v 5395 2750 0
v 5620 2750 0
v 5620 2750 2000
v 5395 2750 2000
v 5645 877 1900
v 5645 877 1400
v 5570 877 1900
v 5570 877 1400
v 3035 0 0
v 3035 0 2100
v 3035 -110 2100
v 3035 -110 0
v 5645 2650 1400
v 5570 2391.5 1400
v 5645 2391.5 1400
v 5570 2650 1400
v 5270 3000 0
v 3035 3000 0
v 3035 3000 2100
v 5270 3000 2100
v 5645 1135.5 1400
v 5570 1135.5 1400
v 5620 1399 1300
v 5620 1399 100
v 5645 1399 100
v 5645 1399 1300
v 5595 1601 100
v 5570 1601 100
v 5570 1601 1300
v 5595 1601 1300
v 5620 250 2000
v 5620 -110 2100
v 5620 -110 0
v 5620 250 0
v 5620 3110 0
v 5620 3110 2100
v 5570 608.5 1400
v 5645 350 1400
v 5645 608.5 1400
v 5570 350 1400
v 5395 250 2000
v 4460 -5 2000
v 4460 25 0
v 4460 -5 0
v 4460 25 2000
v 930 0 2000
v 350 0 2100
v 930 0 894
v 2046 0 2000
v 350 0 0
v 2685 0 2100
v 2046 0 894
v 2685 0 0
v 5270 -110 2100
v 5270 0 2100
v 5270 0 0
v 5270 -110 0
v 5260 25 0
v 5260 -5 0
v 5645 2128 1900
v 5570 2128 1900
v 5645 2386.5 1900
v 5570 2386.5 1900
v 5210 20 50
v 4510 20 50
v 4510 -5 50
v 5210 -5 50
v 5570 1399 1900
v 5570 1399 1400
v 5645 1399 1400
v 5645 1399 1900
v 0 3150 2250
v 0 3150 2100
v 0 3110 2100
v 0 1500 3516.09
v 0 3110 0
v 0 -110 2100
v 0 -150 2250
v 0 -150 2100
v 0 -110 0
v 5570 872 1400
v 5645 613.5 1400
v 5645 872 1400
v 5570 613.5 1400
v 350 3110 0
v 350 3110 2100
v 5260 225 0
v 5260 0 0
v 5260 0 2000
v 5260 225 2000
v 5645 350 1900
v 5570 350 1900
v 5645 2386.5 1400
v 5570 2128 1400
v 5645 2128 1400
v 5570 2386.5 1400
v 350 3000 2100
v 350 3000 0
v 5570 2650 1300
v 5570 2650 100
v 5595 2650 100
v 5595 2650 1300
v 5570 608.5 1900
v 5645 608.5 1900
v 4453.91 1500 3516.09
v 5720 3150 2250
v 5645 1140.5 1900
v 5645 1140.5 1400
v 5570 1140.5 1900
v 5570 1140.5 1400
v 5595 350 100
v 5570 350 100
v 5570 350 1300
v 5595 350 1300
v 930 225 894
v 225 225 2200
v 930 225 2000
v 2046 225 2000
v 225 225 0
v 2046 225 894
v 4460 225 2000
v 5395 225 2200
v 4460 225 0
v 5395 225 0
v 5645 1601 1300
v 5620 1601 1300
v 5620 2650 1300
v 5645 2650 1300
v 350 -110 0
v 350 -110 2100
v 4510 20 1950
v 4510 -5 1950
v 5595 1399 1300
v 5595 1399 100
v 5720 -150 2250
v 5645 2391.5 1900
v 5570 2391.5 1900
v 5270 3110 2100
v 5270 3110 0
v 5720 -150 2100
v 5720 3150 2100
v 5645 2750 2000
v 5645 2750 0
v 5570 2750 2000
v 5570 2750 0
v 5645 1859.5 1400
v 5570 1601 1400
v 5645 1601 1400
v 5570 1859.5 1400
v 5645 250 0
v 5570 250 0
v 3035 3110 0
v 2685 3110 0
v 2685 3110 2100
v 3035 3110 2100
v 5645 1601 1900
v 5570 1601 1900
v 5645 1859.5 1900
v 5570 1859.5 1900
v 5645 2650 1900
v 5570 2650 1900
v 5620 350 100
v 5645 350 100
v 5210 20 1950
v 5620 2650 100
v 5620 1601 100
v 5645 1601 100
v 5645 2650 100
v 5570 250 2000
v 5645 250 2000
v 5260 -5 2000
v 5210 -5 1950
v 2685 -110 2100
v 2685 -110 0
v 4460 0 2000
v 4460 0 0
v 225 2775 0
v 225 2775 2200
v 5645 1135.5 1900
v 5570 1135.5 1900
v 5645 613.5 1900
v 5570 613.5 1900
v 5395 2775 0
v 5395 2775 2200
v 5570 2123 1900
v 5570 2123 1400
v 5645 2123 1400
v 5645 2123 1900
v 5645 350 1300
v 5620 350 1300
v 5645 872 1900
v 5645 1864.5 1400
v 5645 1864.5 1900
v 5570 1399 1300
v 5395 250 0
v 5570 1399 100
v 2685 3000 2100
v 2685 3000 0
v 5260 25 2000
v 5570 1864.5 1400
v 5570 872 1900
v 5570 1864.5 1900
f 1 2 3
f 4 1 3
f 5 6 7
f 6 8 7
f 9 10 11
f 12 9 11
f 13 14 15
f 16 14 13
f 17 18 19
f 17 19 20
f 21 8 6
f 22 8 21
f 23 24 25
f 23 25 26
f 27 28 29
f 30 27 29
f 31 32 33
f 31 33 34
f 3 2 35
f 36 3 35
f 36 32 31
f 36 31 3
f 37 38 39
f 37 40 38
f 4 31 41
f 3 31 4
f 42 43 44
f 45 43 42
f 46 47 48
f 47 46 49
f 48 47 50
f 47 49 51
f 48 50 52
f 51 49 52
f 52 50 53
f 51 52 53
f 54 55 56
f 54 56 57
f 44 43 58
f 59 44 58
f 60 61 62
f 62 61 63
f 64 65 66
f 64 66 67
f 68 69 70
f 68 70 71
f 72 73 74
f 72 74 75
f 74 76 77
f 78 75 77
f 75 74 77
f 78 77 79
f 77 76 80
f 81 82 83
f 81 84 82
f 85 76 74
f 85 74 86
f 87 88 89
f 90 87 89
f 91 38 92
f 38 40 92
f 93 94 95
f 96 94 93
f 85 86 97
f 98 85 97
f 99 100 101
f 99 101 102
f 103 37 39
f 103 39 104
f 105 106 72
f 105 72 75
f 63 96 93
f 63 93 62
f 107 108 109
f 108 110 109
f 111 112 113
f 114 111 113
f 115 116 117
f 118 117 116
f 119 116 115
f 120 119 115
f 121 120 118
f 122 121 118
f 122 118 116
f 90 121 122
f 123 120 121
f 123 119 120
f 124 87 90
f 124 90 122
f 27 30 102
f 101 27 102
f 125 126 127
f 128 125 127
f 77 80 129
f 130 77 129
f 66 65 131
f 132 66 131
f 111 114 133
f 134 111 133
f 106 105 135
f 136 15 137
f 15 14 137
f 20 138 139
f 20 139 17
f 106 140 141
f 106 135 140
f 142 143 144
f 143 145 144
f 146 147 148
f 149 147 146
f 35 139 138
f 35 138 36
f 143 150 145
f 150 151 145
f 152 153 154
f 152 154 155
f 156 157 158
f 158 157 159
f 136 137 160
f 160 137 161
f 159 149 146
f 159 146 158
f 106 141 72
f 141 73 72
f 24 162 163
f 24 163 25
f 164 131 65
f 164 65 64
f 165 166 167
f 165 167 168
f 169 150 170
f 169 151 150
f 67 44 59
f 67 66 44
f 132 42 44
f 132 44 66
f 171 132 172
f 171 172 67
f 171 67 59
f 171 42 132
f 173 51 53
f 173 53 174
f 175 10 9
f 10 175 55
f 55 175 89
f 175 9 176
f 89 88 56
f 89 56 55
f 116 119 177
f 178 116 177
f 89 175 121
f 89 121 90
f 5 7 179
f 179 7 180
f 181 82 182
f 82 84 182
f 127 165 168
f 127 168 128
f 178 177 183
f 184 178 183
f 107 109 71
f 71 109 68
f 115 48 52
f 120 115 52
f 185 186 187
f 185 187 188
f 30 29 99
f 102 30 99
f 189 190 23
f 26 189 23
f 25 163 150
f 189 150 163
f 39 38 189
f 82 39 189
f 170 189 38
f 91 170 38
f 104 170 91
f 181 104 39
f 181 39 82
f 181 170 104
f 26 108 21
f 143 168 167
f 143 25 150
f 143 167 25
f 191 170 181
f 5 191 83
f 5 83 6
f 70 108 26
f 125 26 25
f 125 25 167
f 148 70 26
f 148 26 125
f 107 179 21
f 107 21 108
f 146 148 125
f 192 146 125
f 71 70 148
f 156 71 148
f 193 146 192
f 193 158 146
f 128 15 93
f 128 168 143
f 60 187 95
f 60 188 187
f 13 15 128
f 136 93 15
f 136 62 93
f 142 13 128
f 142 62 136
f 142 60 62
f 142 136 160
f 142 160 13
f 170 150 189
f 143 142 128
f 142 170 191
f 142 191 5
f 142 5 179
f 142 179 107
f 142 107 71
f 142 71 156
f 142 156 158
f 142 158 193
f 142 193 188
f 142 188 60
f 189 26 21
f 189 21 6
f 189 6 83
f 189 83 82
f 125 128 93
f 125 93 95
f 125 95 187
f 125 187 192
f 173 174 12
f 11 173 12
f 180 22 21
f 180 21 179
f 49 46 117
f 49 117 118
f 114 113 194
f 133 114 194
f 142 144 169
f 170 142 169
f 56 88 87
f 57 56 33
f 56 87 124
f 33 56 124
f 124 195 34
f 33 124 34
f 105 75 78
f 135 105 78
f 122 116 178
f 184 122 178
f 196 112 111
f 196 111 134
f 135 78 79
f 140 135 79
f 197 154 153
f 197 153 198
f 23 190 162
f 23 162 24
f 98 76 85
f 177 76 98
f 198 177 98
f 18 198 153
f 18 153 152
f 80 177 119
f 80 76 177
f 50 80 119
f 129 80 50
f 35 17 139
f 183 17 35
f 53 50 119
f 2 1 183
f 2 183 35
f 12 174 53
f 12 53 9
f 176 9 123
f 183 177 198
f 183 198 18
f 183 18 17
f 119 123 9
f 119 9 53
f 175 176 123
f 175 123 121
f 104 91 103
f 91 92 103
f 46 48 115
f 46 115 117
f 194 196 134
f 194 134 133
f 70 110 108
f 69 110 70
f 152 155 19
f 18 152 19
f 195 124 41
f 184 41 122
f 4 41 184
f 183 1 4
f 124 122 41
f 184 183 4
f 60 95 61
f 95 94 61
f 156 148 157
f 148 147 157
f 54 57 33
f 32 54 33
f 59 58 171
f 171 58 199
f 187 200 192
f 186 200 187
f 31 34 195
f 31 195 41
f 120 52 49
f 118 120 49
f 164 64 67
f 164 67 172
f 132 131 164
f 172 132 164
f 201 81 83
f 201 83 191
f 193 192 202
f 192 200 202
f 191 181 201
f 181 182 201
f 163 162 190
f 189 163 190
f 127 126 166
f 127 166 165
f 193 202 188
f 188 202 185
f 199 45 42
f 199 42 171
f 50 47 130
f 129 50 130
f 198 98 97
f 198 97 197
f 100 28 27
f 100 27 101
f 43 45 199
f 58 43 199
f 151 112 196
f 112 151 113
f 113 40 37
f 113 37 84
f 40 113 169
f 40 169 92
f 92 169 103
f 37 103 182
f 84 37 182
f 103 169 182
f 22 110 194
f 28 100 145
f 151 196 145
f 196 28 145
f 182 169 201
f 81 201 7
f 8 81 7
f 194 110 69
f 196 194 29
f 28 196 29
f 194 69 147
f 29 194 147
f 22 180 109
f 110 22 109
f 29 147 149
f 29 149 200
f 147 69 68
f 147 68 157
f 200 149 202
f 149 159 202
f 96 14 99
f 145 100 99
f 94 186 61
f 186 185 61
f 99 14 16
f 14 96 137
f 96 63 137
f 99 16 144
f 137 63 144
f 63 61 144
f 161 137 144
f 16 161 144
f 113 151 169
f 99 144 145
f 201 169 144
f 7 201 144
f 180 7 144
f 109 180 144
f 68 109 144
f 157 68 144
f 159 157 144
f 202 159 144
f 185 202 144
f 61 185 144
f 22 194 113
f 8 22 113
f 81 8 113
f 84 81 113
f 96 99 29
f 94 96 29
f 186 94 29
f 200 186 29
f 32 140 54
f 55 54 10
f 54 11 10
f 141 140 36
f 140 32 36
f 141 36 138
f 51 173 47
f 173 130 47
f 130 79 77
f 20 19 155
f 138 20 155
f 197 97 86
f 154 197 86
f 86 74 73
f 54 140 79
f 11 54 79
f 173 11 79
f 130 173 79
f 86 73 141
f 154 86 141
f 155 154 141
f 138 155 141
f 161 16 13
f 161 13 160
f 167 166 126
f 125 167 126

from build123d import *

# Parameters (mm, degrees)
F0_W           = 5620
F0_H           = 3000
F0_W_2         = 5170
F0_H_2         = 2550
F1_DEPTH       = 2200
F2_W           = 2500
F2_H           = 2000
F3_DEPTH       = 225
F4_W           = 1116
F4_H           = 1106
F4_W_2         = 800
F4_H_2         = 2000
F5_DEPTH       = 225
F7_W           = 800
F7_H           = 2000
F7_W_2         = 700
F7_H_2         = 1900
F8_DEPTH       = 30
F9_DEPTH       = 5
F11_DEPTH      = 5620
F11_DEPTH_BACK = 100
F12_DEPTH      = 100
F14_DEPTH      = 6760
F15_W          = 350
F15_H          = 110
F16_DEPTH      = 2100
F17_W          = 1249
F17_H          = 2000
F17_W_2        = 1049
F17_H_2        = 1200
F17_W_3        = 258.5
F17_H_3        = 500
F17_W_4        = 2
F18_DEPTH      = 50
F18_DEPTH_BACK = 25
F19_DEPTH      = 25


with BuildPart() as f1:
    # F0 (on Top) → F1 (new body)
    with BuildSketch(Plane.XY):
        with Locations((2810, 1500)):
            Rectangle(F0_W, F0_H)
        with Locations((2810, 1500)):
            Rectangle(F0_W_2, F0_H_2, mode=Mode.SUBTRACT)
    extrude(amount=F1_DEPTH)

    # F2 (on face) → F3 (cut, through all)
    with BuildSketch(Plane.YZ.offset(5620)):
        with Locations((1500, 1000)):
            Rectangle(F2_W, F2_H)
    extrude(amount=-F3_DEPTH, mode=Mode.SUBTRACT)

    # F4 (on face) → F5 (cut, through all)
    with BuildSketch(Plane.XZ):
        with Locations((1488, 1447)):
            Rectangle(F4_W, F4_H)
        with Locations((4860, 1000)):
            Rectangle(F4_W_2, F4_H_2)
    extrude(amount=-F5_DEPTH, mode=Mode.SUBTRACT)

    # F10 (on face) → F11 (join, two sides)
    with BuildSketch(Plane.YZ.offset(5620)) as f11_sk:
        Polygon((-150, 2100), (0, 2100), (0, 2200), (3000, 2200), (3000, 2100), (3150, 2100), (3150, 2250), (1500, 3516.0895301653), (-150, 2250), align=None)
    extrude(amount=-F11_DEPTH)
    extrude(f11_sk.sketch, amount=F11_DEPTH_BACK)

    # F12 (add, through all): a face of the model
    f12_faces = [f1.faces().sort_by_distance(p)[0] for p in [
        (5670, 1500, 2200),
    ]]
    extrude(f12_faces, amount=F12_DEPTH)

    # F13 (on face) → F14 (cut)
    with BuildSketch(Plane.XZ.offset(150)):
        Polygon((3720, 4250), (5720, 2250), (5720, 4250), align=None)
    extrude(amount=-F14_DEPTH, mode=Mode.SUBTRACT)

    # F15 (on face) → F16 (join, through all)
    with BuildSketch(Plane(origin=(0, 0, 0), x_dir=(1, 0, 0), z_dir=(0, 0, -1))):
        with Locations((175, 55)):
            Rectangle(F15_W, F15_H)
        with Locations((2860, 55)):
            Rectangle(F15_W, F15_H)
        with Locations((5445, 55)):
            Rectangle(F15_W, F15_H)
        with Locations((175, -3055)):
            Rectangle(F15_W, F15_H)
        with Locations((2860, -3055)):
            Rectangle(F15_W, F15_H)
        with Locations((5445, -3055)):
            Rectangle(F15_W, F15_H)
    extrude(amount=-F16_DEPTH)


with BuildPart() as f8:
    # F7 (on offset) → F8 (new body)
    with BuildSketch(Plane.XZ.offset(-25)):
        with Locations((4860, 1000)):
            Rectangle(F7_W, F7_H)
        with Locations((4860, 1000)):
            Rectangle(F7_W_2, F7_H_2, mode=Mode.SUBTRACT)
    extrude(amount=F8_DEPTH)

    # F7 (on offset) → F9 (join)
    with BuildSketch(Plane.XZ.offset(-25)):
        with Locations((4860, 1000)):
            Rectangle(F7_W_2, F7_H_2)
    extrude(amount=F9_DEPTH)


with BuildPart() as f18:
    # F17 (on face) → F18 (new body, two sides)
    with BuildSketch(Plane.YZ.offset(5620)) as f18_sk:
        with Locations((874.5, 1000)):
            Rectangle(F17_W, F17_H)
        with Locations((874.5, 700)):
            Rectangle(F17_W_2, F17_H_2, mode=Mode.SUBTRACT)
        with Locations((479.25, 1650)):
            Rectangle(F17_W_3, F17_H_3, mode=Mode.SUBTRACT)
        with Locations((742.75, 1650)):
            Rectangle(F17_W_3, F17_H_3, mode=Mode.SUBTRACT)
        with Locations((1006.25, 1650)):
            Rectangle(F17_W_3, F17_H_3, mode=Mode.SUBTRACT)
        with Locations((1269.75, 1650)):
            Rectangle(F17_W_3, F17_H_3, mode=Mode.SUBTRACT)
        with Locations((1500, 1000)):
            Rectangle(F17_W_4, F17_H)
        with Locations((2125.5, 1000)):
            Rectangle(F17_W, F17_H)
        with Locations((2125.5, 700)):
            Rectangle(F17_W_2, F17_H_2, mode=Mode.SUBTRACT)
        with Locations((1730.25, 1650)):
            Rectangle(F17_W_3, F17_H_3, mode=Mode.SUBTRACT)
        with Locations((1993.75, 1650)):
            Rectangle(F17_W_3, F17_H_3, mode=Mode.SUBTRACT)
        with Locations((2257.25, 1650)):
            Rectangle(F17_W_3, F17_H_3, mode=Mode.SUBTRACT)
        with Locations((2520.75, 1650)):
            Rectangle(F17_W_3, F17_H_3, mode=Mode.SUBTRACT)
    extrude(amount=-F18_DEPTH)
    extrude(f18_sk.sketch, amount=F18_DEPTH_BACK)

    # F17 (on face) → F19 (join)
    with BuildSketch(Plane.YZ.offset(5620)):
        with Locations((874.5, 700)):
            Rectangle(F17_W_2, F17_H_2)
        with Locations((2125.5, 700)):
            Rectangle(F17_W_2, F17_H_2)
    extrude(amount=-F19_DEPTH)


solid = Compound([f1.part, f8.part, f18.part])
